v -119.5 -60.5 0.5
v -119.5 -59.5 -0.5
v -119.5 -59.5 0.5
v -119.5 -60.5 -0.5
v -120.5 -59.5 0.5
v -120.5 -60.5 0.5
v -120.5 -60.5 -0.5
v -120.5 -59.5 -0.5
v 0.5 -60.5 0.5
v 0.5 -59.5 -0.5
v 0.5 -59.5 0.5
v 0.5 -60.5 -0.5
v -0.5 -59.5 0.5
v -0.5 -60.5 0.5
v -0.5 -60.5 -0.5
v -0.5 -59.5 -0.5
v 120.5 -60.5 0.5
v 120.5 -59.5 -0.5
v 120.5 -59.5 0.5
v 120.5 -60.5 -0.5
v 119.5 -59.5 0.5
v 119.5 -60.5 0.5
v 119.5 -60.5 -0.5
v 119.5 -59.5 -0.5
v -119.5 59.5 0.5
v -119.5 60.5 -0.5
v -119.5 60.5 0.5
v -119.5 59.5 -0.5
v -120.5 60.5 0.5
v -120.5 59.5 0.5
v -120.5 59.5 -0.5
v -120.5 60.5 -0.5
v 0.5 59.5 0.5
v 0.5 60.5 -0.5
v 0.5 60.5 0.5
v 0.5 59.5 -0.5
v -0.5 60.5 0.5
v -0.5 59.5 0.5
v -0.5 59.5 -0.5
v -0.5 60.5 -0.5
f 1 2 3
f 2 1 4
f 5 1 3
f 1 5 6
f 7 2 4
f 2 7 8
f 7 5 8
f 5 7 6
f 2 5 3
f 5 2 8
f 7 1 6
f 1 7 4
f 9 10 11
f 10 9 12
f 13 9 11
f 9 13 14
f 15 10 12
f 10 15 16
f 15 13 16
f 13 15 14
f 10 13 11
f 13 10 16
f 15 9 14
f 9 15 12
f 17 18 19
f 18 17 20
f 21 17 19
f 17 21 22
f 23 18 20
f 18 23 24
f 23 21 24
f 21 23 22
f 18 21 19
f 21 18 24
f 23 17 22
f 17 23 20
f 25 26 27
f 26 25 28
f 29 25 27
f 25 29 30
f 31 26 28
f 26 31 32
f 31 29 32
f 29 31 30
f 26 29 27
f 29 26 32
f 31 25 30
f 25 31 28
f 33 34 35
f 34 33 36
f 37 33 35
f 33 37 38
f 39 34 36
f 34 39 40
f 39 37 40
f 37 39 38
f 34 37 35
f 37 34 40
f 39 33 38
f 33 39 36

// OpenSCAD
// design_20251106_153133 - Generated by Kalki Design Engine
// Generated: 2025-11-06T15:31:33.932584
// Design Type: robotics


// Preview helpers (only rendered in OpenSCAD preview mode)
module preview_axes(axis_len=120) {
    color([1, 0, 0, 0.3]) cube([axis_len, 2, 2], center=true); // X-axis
    color([0, 1, 0, 0.3]) cube([2, axis_len, 2], center=true); // Y-axis
    color([0, 0, 1, 0.3]) cube([2, 2, axis_len], center=true); // Z-axis
}

module preview_origin_marker(size=4) {
    color([1, 0.5, 0, 0.5]) sphere(r=size);
}

// Mechanical component libraries
module servo_motor(length=60, diameter=40, shaft_diameter=6, shaft_length=20) {
    // Motor body
    color([0.3, 0.3, 0.3]) cylinder(h=length, d=diameter, center=true);
    // Mounting flanges
    color([0.4, 0.4, 0.4]) {
        translate([0, 0, length/2 + 2]) cylinder(h=4, d=diameter + 10, center=true);
        translate([0, 0, -length/2 - 2]) cylinder(h=4, d=diameter + 10, center=true);
    }
    // Shaft
    color([0.8, 0.8, 0.8]) translate([0, 0, length/2 + shaft_length/2]) cylinder(h=shaft_length, d=shaft_diameter, center=true);
    // Mounting holes
    for (angle = [0, 90, 180, 270]) {
        rotate([0, 0, angle]) translate([diameter/2 + 5, 0, 0]) cylinder(h=length + 10, d=3, center=true);
    }
}

module bearing(outer_diameter=30, inner_diameter=10, thickness=8) {
    // Outer race
    color([0.6, 0.6, 0.6]) difference() {
        cylinder(h=thickness, d=outer_diameter, center=true);
        cylinder(h=thickness + 2, d=inner_diameter, center=true);
    }
    // Inner race
    color([0.7, 0.7, 0.7]) cylinder(h=thickness - 2, d=inner_diameter + 4, center=true);
    // Balls (simplified)
    color([0.9, 0.9, 0.9]) for (angle = [0:45:315]) {
        rotate([0, 0, angle]) translate([(outer_diameter + inner_diameter)/4, 0, 0]) sphere(r=2);
    }
}

module gear(radius=25, thickness=10, teeth=20) {
    // Gear body
    color([0.4, 0.4, 0.4]) cylinder(h=thickness, d=radius*2, center=true);
    // Teeth (simplified)
    color([0.3, 0.3, 0.3]) for (angle = [0:360/teeth:359]) {
        rotate([0, 0, angle]) translate([radius - 2, 0, 0]) cube([4, 3, thickness], center=true);
    }
    // Center hole
    color([0.2, 0.2, 0.2]) cylinder(h=thickness + 2, d=8, center=true);
}

module harmonic_drive(cup_diameter=60, flex_spline_diameter=50, thickness=15) {
    // Wave generator (simplified)
    color([0.5, 0.5, 0.5]) cylinder(h=thickness, d=cup_diameter * 0.7, center=true);
    // Flex spline
    color([0.6, 0.6, 0.6]) cylinder(h=thickness - 2, d=flex_spline_diameter, center=true);
    // Circular spline
    color([0.4, 0.4, 0.4]) difference() {
        cylinder(h=thickness - 4, d=cup_diameter, center=true);
        cylinder(h=thickness, d=flex_spline_diameter + 5, center=true);
    }
}

module robotic_link(length=200, diameter=40, wall_thickness=3) {
    // Hollow cylindrical link
    color([0.8, 0.8, 0.9]) difference() {
        cylinder(h=length, d=diameter, center=true);
        cylinder(h=length + 2, d=diameter - wall_thickness*2, center=true);
    }
    // End flanges
    color([0.7, 0.7, 0.8]) {
        translate([0, 0, length/2]) cylinder(h=6, d=diameter + 10, center=true);
        translate([0, 0, -length/2]) cylinder(h=6, d=diameter + 10, center=true);
    }
    // Mounting holes
    for (z_pos = [-length/3, 0, length/3]) {
        translate([0, 0, z_pos]) for (angle = [0, 90, 180, 270]) {
            rotate([0, 0, angle]) translate([diameter/2 + 5, 0, 0]) cylinder(h=8, d=4, center=true);
        }
    }
}

module end_effector(gripper_width=80, gripper_length=60, finger_length=40) {
    // Base
    color([0.3, 0.3, 0.3]) cube([gripper_width, gripper_length, 20], center=true);
    // Fingers
    color([0.5, 0.5, 0.5]) {
        translate([-gripper_width/4, gripper_length/2 + finger_length/2, 10]) cube([8, finger_length, 4], center=true);
        translate([gripper_width/4, gripper_length/2 + finger_length/2, 10]) cube([8, finger_length, 4], center=true);
    }
    // Actuator
    translate([0, -gripper_length/4, 15]) servo_motor(30, 25, 4, 10);
}

// Component 1: chassis
module component_0() {
    // Type: Provides chassis functionality
    cube([1.0, 1.0, 1.0], center=true);
}

// Component 2: actuators
module component_1() {
    // Type: Provides actuators functionality
    cube([1.0, 1.0, 1.0], center=true);
}

// Component 3: sensors
module component_2() {
    // Type: Provides sensors functionality
    cube([1.0, 1.0, 1.0], center=true);
}

// Component 4: controller
module component_3() {
    // Type: Provides controller functionality
    cube([1.0, 1.0, 1.0], center=true);
}

// Component 5: power
module component_4() {
    // Type: Provides power functionality
    cube([1.0, 1.0, 1.0], center=true);
}

// Assembly
translate([-120.00, -60.00, 0]) component_0();
translate([0.00, -60.00, 0]) component_1();
translate([120.00, -60.00, 0]) component_2();
translate([-120.00, 60.00, 0]) component_3();
translate([0.00, 60.00, 0]) component_4();


if ($preview) {
    preview_axes(axis_len=360.00);
    preview_origin_marker(size=6);
}
